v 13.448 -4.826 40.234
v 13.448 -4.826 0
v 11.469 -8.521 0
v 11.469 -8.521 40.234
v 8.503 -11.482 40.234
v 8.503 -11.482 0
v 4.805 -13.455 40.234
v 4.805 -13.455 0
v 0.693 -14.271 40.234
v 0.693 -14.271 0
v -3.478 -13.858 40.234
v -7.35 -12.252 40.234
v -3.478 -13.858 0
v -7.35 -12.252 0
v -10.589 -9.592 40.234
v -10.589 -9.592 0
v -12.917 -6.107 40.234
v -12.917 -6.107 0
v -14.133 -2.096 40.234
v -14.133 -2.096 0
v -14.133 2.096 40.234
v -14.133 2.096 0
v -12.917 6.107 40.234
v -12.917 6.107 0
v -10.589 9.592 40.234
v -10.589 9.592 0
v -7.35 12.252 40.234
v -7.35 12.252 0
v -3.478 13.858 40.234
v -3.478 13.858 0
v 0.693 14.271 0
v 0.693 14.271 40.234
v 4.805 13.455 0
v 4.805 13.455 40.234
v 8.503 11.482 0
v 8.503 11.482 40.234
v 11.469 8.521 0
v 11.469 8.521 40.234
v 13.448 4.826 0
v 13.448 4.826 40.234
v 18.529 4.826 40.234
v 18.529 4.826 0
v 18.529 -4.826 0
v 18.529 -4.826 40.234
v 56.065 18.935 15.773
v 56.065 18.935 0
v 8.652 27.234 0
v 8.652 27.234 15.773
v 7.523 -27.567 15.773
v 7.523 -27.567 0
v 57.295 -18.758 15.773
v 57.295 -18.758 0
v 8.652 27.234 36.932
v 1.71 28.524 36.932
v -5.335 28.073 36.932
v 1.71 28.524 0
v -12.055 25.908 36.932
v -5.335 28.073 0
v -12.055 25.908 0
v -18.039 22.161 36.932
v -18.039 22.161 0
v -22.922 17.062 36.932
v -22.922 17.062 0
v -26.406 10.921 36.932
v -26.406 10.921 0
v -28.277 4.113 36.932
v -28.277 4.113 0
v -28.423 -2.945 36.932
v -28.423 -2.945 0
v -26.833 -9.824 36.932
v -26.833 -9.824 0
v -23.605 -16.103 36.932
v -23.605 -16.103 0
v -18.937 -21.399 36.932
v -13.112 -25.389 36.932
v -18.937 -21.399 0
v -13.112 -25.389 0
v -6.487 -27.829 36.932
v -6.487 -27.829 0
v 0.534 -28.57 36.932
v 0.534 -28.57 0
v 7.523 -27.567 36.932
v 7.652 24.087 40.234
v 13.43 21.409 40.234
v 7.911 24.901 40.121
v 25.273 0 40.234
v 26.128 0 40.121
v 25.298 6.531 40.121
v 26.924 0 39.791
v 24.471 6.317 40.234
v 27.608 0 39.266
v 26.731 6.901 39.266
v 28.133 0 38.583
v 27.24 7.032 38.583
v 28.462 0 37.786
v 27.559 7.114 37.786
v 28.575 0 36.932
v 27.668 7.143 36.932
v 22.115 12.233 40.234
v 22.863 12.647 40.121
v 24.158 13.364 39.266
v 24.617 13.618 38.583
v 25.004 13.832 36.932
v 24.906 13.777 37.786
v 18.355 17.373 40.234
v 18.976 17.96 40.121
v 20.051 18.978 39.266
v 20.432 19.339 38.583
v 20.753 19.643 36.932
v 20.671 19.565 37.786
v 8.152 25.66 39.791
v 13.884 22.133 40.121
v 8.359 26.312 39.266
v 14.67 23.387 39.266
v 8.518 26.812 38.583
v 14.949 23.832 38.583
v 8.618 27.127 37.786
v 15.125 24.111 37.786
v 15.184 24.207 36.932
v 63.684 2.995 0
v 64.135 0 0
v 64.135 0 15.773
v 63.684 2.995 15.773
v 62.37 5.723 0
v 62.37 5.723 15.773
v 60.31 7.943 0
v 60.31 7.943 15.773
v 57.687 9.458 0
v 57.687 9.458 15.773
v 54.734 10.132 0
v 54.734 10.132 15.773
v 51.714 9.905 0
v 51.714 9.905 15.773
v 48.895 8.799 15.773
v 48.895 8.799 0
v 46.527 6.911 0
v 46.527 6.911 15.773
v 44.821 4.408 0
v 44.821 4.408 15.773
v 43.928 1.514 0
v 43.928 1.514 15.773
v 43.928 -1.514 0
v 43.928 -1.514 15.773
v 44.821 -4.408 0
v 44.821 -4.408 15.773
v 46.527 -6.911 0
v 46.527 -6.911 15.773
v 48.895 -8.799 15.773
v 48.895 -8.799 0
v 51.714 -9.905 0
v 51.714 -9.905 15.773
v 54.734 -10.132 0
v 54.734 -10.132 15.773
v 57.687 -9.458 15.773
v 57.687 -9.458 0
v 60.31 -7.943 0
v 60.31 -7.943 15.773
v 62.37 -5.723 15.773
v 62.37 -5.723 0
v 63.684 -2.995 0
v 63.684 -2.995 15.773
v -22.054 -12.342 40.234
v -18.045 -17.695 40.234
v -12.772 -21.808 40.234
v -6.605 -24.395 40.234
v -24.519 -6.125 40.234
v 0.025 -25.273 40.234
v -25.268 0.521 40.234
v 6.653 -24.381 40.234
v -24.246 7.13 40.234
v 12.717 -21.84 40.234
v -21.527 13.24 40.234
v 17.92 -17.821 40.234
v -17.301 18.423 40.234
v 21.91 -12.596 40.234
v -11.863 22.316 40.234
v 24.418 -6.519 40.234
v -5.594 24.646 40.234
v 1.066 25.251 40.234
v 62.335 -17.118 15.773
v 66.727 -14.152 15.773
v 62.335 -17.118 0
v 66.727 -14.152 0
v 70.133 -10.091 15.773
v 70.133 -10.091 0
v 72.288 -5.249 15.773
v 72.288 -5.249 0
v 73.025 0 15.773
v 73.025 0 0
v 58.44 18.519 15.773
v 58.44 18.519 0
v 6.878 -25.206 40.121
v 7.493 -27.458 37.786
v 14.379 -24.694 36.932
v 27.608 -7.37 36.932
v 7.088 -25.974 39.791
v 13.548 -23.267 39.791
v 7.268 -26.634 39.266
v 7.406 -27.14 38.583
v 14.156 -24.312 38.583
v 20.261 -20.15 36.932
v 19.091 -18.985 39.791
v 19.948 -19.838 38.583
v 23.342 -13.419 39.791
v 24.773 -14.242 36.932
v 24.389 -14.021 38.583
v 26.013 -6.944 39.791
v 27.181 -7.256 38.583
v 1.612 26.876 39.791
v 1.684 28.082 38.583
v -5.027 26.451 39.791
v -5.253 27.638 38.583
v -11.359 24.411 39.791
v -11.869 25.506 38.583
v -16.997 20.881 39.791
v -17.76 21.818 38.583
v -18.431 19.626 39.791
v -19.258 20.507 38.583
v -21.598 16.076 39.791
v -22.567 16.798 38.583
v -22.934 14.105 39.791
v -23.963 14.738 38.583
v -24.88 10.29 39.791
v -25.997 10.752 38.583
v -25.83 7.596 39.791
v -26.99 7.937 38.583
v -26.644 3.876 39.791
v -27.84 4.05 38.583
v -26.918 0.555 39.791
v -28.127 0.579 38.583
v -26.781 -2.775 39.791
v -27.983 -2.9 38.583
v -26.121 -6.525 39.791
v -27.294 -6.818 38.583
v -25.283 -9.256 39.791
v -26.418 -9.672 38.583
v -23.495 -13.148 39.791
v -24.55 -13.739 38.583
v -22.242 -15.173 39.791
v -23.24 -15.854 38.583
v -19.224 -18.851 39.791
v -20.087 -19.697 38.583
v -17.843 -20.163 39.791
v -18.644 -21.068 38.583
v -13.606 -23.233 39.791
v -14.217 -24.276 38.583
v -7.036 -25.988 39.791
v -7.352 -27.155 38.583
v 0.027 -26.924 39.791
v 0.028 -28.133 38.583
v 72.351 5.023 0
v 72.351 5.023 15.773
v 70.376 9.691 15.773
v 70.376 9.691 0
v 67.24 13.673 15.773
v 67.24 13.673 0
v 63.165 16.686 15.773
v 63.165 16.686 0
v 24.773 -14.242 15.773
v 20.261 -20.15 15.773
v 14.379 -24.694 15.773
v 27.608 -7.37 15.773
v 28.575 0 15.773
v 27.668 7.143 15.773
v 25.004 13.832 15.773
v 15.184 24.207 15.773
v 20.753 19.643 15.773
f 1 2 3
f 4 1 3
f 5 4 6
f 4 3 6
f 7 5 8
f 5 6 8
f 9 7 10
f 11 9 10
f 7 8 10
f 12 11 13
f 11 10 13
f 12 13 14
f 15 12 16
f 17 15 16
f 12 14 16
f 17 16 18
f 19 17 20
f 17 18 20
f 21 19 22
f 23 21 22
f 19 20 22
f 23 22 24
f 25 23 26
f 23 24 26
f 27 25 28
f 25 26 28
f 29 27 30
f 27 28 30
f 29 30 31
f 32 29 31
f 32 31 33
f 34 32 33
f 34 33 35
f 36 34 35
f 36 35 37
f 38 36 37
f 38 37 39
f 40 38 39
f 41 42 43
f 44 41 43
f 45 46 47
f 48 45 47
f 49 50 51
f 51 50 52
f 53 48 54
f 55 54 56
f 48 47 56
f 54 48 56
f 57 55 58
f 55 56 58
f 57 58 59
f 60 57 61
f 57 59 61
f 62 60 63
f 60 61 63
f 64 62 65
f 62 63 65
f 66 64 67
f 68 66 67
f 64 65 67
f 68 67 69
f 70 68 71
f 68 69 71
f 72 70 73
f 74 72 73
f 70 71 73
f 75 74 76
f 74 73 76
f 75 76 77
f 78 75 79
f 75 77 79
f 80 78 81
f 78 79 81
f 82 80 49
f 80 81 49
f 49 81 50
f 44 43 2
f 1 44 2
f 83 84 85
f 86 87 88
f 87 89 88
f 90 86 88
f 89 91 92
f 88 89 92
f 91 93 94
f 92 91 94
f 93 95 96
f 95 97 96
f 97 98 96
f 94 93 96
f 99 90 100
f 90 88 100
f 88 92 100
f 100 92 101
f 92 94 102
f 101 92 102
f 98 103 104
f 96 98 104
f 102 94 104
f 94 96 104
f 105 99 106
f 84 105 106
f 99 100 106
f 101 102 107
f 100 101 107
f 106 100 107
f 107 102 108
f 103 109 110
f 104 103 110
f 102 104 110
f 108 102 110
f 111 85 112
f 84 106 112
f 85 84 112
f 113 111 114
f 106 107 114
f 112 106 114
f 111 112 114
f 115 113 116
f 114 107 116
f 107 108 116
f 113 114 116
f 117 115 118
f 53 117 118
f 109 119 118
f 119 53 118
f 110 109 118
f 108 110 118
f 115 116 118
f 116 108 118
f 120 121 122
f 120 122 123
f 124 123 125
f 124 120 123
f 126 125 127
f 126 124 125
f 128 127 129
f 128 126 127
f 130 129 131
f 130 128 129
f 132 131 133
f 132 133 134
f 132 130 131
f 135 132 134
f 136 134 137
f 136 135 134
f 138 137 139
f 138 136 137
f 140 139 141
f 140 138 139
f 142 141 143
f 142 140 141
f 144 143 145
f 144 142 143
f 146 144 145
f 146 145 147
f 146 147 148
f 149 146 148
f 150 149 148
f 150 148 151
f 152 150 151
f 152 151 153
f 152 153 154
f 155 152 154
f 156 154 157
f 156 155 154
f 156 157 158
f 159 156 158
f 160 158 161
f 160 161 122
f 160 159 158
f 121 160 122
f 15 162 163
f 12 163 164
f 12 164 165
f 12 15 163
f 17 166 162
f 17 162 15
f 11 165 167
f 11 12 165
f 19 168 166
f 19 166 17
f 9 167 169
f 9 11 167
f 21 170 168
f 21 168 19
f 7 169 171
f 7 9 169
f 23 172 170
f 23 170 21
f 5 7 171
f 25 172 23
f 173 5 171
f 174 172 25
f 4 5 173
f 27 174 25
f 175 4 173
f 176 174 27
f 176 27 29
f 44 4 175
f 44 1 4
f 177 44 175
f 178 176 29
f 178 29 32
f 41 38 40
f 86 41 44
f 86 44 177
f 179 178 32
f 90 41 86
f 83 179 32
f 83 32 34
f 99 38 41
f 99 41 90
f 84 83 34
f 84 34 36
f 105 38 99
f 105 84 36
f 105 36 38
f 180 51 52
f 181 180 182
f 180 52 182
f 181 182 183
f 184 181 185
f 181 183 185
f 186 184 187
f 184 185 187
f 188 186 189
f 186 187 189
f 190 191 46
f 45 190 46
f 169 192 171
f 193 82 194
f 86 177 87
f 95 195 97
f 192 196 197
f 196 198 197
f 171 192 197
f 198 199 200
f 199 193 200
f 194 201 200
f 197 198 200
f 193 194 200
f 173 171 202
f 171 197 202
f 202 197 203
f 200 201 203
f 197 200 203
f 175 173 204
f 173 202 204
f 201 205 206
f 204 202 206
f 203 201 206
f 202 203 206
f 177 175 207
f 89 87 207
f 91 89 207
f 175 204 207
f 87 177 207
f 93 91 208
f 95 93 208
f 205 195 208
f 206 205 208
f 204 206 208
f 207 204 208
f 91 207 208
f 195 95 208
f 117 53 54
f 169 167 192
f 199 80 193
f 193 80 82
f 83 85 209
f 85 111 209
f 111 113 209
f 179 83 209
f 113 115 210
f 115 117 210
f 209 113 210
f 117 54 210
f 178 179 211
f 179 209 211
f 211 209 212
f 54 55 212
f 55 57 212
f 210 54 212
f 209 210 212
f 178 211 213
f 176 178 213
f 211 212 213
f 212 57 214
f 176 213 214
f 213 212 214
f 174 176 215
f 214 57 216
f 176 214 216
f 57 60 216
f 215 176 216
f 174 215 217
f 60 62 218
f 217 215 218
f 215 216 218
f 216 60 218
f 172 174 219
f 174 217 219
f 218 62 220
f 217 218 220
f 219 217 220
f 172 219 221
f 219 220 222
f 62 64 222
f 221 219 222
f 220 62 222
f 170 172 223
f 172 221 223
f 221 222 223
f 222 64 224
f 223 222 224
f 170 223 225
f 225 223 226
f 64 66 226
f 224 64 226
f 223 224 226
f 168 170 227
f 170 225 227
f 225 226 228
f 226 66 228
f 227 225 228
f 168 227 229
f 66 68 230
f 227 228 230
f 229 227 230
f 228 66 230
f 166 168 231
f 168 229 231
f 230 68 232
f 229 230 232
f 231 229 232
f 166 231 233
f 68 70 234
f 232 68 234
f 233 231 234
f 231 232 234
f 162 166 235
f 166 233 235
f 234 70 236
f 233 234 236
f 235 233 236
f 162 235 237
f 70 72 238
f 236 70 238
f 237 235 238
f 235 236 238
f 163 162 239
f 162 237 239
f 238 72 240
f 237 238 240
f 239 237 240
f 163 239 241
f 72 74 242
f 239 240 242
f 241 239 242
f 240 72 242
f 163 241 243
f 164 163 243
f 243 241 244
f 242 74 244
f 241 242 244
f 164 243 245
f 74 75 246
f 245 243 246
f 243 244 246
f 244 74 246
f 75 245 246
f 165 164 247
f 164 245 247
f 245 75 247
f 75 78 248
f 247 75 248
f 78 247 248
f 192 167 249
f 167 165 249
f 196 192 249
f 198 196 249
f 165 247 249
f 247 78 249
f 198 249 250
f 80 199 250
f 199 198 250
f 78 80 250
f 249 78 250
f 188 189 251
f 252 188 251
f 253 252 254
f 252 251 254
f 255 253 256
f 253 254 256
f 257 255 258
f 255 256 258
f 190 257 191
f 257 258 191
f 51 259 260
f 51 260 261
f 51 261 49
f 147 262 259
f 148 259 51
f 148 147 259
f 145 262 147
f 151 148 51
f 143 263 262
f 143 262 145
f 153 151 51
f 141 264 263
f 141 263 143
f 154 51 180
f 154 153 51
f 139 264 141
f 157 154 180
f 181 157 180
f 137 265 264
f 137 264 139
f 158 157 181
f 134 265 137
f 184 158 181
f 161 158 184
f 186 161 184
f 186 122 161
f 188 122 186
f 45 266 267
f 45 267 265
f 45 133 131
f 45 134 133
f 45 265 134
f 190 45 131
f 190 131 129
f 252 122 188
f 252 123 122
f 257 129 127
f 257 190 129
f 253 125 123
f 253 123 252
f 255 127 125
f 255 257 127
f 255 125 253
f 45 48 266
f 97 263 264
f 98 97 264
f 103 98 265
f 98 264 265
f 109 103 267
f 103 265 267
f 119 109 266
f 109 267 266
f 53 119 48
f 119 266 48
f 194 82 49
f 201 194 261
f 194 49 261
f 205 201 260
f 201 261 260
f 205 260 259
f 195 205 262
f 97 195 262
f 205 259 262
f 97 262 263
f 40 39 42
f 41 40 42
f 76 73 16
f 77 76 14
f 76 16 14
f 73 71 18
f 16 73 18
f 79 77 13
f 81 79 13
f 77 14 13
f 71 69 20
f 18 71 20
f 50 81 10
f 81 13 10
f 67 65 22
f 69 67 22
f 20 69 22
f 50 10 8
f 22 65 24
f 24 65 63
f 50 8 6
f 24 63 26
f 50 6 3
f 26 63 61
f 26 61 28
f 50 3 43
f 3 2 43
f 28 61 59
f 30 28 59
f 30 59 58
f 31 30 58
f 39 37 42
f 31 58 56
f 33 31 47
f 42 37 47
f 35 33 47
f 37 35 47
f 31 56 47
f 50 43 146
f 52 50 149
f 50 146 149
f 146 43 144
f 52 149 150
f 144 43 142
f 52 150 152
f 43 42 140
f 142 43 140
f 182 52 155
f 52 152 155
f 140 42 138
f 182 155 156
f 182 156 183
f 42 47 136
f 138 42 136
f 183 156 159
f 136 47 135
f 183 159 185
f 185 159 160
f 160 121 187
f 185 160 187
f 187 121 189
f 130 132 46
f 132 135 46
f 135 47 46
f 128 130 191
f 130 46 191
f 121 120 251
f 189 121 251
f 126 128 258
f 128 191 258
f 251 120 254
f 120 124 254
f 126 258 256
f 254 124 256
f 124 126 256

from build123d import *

# Parameters (mm, degrees)
F0_R     = 10.16
F1_DEPTH = 15.7734
F3_DEPTH = 40.2336
F4_R     = 3.302


with BuildPart() as f1:
    # F0 (on Top) → F1 (new body)
    with BuildSketch(Plane.XY):
        with BuildLine():
            ThreePointArc((8.651677, 27.233786), (23.06244, 16.871706), (28.575, 0))
            ThreePointArc((28.575, 0), (22.710053, -17.343129), (7.522744, -27.56699))
            Line((7.522744, -27.56699), (57.294815, -18.7585))
            ThreePointArc((57.294815, -18.7585), (34.935126, -0.621041), (56.065332, 18.934968))
            Line((56.065332, 18.934968), (8.651677, 27.233786))
        make_face()
        with BuildLine():
            Line((58.440289, 18.519279), (56.065332, 18.934968))
            ThreePointArc((56.065332, 18.934968), (34.935126, -0.621041), (57.294815, -18.7585))
            ThreePointArc((57.294815, -18.7585), (68.572003, -12.240507), (73.025, 0))
            ThreePointArc((73.025, 0), (68.941066, 11.786406), (58.440289, 18.519279))
        make_face()
        with Locations((53.975, 0)):
            Circle(F0_R, mode=Mode.SUBTRACT)
    extrude(amount=F1_DEPTH)

    # F2 (on Top) → F3 (join)
    with BuildSketch(Plane.XY):
        with BuildLine():
            ThreePointArc((7.522744, -27.56699), (22.710053, -17.343129), (28.575, 0))
            ThreePointArc((28.575, 0), (23.06244, 16.871706), (8.651677, 27.233786))
            ThreePointArc((8.651677, 27.233786), (-28.568938, 0.58854), (7.522744, -27.56699))
        make_face()
        with BuildLine():
            ThreePointArc((13.447765, -4.826), (-14.2875, 0), (13.447765, 4.826))
            Line((13.447765, 4.826), (18.5293, 4.826))
            Line((18.5293, 4.826), (18.5293, -4.826))
            Line((18.5293, -4.826), (13.447765, -4.826))
        make_face(mode=Mode.SUBTRACT)
    extrude(amount=F3_DEPTH)

    # F4
    f4_edges = [f1.edges().sort_by_distance(p)[0] for p in [
        (-7.522744, 27.56699, 40.2336),
    ]]
    fillet(f4_edges, radius=F4_R)


solid = f1.part
